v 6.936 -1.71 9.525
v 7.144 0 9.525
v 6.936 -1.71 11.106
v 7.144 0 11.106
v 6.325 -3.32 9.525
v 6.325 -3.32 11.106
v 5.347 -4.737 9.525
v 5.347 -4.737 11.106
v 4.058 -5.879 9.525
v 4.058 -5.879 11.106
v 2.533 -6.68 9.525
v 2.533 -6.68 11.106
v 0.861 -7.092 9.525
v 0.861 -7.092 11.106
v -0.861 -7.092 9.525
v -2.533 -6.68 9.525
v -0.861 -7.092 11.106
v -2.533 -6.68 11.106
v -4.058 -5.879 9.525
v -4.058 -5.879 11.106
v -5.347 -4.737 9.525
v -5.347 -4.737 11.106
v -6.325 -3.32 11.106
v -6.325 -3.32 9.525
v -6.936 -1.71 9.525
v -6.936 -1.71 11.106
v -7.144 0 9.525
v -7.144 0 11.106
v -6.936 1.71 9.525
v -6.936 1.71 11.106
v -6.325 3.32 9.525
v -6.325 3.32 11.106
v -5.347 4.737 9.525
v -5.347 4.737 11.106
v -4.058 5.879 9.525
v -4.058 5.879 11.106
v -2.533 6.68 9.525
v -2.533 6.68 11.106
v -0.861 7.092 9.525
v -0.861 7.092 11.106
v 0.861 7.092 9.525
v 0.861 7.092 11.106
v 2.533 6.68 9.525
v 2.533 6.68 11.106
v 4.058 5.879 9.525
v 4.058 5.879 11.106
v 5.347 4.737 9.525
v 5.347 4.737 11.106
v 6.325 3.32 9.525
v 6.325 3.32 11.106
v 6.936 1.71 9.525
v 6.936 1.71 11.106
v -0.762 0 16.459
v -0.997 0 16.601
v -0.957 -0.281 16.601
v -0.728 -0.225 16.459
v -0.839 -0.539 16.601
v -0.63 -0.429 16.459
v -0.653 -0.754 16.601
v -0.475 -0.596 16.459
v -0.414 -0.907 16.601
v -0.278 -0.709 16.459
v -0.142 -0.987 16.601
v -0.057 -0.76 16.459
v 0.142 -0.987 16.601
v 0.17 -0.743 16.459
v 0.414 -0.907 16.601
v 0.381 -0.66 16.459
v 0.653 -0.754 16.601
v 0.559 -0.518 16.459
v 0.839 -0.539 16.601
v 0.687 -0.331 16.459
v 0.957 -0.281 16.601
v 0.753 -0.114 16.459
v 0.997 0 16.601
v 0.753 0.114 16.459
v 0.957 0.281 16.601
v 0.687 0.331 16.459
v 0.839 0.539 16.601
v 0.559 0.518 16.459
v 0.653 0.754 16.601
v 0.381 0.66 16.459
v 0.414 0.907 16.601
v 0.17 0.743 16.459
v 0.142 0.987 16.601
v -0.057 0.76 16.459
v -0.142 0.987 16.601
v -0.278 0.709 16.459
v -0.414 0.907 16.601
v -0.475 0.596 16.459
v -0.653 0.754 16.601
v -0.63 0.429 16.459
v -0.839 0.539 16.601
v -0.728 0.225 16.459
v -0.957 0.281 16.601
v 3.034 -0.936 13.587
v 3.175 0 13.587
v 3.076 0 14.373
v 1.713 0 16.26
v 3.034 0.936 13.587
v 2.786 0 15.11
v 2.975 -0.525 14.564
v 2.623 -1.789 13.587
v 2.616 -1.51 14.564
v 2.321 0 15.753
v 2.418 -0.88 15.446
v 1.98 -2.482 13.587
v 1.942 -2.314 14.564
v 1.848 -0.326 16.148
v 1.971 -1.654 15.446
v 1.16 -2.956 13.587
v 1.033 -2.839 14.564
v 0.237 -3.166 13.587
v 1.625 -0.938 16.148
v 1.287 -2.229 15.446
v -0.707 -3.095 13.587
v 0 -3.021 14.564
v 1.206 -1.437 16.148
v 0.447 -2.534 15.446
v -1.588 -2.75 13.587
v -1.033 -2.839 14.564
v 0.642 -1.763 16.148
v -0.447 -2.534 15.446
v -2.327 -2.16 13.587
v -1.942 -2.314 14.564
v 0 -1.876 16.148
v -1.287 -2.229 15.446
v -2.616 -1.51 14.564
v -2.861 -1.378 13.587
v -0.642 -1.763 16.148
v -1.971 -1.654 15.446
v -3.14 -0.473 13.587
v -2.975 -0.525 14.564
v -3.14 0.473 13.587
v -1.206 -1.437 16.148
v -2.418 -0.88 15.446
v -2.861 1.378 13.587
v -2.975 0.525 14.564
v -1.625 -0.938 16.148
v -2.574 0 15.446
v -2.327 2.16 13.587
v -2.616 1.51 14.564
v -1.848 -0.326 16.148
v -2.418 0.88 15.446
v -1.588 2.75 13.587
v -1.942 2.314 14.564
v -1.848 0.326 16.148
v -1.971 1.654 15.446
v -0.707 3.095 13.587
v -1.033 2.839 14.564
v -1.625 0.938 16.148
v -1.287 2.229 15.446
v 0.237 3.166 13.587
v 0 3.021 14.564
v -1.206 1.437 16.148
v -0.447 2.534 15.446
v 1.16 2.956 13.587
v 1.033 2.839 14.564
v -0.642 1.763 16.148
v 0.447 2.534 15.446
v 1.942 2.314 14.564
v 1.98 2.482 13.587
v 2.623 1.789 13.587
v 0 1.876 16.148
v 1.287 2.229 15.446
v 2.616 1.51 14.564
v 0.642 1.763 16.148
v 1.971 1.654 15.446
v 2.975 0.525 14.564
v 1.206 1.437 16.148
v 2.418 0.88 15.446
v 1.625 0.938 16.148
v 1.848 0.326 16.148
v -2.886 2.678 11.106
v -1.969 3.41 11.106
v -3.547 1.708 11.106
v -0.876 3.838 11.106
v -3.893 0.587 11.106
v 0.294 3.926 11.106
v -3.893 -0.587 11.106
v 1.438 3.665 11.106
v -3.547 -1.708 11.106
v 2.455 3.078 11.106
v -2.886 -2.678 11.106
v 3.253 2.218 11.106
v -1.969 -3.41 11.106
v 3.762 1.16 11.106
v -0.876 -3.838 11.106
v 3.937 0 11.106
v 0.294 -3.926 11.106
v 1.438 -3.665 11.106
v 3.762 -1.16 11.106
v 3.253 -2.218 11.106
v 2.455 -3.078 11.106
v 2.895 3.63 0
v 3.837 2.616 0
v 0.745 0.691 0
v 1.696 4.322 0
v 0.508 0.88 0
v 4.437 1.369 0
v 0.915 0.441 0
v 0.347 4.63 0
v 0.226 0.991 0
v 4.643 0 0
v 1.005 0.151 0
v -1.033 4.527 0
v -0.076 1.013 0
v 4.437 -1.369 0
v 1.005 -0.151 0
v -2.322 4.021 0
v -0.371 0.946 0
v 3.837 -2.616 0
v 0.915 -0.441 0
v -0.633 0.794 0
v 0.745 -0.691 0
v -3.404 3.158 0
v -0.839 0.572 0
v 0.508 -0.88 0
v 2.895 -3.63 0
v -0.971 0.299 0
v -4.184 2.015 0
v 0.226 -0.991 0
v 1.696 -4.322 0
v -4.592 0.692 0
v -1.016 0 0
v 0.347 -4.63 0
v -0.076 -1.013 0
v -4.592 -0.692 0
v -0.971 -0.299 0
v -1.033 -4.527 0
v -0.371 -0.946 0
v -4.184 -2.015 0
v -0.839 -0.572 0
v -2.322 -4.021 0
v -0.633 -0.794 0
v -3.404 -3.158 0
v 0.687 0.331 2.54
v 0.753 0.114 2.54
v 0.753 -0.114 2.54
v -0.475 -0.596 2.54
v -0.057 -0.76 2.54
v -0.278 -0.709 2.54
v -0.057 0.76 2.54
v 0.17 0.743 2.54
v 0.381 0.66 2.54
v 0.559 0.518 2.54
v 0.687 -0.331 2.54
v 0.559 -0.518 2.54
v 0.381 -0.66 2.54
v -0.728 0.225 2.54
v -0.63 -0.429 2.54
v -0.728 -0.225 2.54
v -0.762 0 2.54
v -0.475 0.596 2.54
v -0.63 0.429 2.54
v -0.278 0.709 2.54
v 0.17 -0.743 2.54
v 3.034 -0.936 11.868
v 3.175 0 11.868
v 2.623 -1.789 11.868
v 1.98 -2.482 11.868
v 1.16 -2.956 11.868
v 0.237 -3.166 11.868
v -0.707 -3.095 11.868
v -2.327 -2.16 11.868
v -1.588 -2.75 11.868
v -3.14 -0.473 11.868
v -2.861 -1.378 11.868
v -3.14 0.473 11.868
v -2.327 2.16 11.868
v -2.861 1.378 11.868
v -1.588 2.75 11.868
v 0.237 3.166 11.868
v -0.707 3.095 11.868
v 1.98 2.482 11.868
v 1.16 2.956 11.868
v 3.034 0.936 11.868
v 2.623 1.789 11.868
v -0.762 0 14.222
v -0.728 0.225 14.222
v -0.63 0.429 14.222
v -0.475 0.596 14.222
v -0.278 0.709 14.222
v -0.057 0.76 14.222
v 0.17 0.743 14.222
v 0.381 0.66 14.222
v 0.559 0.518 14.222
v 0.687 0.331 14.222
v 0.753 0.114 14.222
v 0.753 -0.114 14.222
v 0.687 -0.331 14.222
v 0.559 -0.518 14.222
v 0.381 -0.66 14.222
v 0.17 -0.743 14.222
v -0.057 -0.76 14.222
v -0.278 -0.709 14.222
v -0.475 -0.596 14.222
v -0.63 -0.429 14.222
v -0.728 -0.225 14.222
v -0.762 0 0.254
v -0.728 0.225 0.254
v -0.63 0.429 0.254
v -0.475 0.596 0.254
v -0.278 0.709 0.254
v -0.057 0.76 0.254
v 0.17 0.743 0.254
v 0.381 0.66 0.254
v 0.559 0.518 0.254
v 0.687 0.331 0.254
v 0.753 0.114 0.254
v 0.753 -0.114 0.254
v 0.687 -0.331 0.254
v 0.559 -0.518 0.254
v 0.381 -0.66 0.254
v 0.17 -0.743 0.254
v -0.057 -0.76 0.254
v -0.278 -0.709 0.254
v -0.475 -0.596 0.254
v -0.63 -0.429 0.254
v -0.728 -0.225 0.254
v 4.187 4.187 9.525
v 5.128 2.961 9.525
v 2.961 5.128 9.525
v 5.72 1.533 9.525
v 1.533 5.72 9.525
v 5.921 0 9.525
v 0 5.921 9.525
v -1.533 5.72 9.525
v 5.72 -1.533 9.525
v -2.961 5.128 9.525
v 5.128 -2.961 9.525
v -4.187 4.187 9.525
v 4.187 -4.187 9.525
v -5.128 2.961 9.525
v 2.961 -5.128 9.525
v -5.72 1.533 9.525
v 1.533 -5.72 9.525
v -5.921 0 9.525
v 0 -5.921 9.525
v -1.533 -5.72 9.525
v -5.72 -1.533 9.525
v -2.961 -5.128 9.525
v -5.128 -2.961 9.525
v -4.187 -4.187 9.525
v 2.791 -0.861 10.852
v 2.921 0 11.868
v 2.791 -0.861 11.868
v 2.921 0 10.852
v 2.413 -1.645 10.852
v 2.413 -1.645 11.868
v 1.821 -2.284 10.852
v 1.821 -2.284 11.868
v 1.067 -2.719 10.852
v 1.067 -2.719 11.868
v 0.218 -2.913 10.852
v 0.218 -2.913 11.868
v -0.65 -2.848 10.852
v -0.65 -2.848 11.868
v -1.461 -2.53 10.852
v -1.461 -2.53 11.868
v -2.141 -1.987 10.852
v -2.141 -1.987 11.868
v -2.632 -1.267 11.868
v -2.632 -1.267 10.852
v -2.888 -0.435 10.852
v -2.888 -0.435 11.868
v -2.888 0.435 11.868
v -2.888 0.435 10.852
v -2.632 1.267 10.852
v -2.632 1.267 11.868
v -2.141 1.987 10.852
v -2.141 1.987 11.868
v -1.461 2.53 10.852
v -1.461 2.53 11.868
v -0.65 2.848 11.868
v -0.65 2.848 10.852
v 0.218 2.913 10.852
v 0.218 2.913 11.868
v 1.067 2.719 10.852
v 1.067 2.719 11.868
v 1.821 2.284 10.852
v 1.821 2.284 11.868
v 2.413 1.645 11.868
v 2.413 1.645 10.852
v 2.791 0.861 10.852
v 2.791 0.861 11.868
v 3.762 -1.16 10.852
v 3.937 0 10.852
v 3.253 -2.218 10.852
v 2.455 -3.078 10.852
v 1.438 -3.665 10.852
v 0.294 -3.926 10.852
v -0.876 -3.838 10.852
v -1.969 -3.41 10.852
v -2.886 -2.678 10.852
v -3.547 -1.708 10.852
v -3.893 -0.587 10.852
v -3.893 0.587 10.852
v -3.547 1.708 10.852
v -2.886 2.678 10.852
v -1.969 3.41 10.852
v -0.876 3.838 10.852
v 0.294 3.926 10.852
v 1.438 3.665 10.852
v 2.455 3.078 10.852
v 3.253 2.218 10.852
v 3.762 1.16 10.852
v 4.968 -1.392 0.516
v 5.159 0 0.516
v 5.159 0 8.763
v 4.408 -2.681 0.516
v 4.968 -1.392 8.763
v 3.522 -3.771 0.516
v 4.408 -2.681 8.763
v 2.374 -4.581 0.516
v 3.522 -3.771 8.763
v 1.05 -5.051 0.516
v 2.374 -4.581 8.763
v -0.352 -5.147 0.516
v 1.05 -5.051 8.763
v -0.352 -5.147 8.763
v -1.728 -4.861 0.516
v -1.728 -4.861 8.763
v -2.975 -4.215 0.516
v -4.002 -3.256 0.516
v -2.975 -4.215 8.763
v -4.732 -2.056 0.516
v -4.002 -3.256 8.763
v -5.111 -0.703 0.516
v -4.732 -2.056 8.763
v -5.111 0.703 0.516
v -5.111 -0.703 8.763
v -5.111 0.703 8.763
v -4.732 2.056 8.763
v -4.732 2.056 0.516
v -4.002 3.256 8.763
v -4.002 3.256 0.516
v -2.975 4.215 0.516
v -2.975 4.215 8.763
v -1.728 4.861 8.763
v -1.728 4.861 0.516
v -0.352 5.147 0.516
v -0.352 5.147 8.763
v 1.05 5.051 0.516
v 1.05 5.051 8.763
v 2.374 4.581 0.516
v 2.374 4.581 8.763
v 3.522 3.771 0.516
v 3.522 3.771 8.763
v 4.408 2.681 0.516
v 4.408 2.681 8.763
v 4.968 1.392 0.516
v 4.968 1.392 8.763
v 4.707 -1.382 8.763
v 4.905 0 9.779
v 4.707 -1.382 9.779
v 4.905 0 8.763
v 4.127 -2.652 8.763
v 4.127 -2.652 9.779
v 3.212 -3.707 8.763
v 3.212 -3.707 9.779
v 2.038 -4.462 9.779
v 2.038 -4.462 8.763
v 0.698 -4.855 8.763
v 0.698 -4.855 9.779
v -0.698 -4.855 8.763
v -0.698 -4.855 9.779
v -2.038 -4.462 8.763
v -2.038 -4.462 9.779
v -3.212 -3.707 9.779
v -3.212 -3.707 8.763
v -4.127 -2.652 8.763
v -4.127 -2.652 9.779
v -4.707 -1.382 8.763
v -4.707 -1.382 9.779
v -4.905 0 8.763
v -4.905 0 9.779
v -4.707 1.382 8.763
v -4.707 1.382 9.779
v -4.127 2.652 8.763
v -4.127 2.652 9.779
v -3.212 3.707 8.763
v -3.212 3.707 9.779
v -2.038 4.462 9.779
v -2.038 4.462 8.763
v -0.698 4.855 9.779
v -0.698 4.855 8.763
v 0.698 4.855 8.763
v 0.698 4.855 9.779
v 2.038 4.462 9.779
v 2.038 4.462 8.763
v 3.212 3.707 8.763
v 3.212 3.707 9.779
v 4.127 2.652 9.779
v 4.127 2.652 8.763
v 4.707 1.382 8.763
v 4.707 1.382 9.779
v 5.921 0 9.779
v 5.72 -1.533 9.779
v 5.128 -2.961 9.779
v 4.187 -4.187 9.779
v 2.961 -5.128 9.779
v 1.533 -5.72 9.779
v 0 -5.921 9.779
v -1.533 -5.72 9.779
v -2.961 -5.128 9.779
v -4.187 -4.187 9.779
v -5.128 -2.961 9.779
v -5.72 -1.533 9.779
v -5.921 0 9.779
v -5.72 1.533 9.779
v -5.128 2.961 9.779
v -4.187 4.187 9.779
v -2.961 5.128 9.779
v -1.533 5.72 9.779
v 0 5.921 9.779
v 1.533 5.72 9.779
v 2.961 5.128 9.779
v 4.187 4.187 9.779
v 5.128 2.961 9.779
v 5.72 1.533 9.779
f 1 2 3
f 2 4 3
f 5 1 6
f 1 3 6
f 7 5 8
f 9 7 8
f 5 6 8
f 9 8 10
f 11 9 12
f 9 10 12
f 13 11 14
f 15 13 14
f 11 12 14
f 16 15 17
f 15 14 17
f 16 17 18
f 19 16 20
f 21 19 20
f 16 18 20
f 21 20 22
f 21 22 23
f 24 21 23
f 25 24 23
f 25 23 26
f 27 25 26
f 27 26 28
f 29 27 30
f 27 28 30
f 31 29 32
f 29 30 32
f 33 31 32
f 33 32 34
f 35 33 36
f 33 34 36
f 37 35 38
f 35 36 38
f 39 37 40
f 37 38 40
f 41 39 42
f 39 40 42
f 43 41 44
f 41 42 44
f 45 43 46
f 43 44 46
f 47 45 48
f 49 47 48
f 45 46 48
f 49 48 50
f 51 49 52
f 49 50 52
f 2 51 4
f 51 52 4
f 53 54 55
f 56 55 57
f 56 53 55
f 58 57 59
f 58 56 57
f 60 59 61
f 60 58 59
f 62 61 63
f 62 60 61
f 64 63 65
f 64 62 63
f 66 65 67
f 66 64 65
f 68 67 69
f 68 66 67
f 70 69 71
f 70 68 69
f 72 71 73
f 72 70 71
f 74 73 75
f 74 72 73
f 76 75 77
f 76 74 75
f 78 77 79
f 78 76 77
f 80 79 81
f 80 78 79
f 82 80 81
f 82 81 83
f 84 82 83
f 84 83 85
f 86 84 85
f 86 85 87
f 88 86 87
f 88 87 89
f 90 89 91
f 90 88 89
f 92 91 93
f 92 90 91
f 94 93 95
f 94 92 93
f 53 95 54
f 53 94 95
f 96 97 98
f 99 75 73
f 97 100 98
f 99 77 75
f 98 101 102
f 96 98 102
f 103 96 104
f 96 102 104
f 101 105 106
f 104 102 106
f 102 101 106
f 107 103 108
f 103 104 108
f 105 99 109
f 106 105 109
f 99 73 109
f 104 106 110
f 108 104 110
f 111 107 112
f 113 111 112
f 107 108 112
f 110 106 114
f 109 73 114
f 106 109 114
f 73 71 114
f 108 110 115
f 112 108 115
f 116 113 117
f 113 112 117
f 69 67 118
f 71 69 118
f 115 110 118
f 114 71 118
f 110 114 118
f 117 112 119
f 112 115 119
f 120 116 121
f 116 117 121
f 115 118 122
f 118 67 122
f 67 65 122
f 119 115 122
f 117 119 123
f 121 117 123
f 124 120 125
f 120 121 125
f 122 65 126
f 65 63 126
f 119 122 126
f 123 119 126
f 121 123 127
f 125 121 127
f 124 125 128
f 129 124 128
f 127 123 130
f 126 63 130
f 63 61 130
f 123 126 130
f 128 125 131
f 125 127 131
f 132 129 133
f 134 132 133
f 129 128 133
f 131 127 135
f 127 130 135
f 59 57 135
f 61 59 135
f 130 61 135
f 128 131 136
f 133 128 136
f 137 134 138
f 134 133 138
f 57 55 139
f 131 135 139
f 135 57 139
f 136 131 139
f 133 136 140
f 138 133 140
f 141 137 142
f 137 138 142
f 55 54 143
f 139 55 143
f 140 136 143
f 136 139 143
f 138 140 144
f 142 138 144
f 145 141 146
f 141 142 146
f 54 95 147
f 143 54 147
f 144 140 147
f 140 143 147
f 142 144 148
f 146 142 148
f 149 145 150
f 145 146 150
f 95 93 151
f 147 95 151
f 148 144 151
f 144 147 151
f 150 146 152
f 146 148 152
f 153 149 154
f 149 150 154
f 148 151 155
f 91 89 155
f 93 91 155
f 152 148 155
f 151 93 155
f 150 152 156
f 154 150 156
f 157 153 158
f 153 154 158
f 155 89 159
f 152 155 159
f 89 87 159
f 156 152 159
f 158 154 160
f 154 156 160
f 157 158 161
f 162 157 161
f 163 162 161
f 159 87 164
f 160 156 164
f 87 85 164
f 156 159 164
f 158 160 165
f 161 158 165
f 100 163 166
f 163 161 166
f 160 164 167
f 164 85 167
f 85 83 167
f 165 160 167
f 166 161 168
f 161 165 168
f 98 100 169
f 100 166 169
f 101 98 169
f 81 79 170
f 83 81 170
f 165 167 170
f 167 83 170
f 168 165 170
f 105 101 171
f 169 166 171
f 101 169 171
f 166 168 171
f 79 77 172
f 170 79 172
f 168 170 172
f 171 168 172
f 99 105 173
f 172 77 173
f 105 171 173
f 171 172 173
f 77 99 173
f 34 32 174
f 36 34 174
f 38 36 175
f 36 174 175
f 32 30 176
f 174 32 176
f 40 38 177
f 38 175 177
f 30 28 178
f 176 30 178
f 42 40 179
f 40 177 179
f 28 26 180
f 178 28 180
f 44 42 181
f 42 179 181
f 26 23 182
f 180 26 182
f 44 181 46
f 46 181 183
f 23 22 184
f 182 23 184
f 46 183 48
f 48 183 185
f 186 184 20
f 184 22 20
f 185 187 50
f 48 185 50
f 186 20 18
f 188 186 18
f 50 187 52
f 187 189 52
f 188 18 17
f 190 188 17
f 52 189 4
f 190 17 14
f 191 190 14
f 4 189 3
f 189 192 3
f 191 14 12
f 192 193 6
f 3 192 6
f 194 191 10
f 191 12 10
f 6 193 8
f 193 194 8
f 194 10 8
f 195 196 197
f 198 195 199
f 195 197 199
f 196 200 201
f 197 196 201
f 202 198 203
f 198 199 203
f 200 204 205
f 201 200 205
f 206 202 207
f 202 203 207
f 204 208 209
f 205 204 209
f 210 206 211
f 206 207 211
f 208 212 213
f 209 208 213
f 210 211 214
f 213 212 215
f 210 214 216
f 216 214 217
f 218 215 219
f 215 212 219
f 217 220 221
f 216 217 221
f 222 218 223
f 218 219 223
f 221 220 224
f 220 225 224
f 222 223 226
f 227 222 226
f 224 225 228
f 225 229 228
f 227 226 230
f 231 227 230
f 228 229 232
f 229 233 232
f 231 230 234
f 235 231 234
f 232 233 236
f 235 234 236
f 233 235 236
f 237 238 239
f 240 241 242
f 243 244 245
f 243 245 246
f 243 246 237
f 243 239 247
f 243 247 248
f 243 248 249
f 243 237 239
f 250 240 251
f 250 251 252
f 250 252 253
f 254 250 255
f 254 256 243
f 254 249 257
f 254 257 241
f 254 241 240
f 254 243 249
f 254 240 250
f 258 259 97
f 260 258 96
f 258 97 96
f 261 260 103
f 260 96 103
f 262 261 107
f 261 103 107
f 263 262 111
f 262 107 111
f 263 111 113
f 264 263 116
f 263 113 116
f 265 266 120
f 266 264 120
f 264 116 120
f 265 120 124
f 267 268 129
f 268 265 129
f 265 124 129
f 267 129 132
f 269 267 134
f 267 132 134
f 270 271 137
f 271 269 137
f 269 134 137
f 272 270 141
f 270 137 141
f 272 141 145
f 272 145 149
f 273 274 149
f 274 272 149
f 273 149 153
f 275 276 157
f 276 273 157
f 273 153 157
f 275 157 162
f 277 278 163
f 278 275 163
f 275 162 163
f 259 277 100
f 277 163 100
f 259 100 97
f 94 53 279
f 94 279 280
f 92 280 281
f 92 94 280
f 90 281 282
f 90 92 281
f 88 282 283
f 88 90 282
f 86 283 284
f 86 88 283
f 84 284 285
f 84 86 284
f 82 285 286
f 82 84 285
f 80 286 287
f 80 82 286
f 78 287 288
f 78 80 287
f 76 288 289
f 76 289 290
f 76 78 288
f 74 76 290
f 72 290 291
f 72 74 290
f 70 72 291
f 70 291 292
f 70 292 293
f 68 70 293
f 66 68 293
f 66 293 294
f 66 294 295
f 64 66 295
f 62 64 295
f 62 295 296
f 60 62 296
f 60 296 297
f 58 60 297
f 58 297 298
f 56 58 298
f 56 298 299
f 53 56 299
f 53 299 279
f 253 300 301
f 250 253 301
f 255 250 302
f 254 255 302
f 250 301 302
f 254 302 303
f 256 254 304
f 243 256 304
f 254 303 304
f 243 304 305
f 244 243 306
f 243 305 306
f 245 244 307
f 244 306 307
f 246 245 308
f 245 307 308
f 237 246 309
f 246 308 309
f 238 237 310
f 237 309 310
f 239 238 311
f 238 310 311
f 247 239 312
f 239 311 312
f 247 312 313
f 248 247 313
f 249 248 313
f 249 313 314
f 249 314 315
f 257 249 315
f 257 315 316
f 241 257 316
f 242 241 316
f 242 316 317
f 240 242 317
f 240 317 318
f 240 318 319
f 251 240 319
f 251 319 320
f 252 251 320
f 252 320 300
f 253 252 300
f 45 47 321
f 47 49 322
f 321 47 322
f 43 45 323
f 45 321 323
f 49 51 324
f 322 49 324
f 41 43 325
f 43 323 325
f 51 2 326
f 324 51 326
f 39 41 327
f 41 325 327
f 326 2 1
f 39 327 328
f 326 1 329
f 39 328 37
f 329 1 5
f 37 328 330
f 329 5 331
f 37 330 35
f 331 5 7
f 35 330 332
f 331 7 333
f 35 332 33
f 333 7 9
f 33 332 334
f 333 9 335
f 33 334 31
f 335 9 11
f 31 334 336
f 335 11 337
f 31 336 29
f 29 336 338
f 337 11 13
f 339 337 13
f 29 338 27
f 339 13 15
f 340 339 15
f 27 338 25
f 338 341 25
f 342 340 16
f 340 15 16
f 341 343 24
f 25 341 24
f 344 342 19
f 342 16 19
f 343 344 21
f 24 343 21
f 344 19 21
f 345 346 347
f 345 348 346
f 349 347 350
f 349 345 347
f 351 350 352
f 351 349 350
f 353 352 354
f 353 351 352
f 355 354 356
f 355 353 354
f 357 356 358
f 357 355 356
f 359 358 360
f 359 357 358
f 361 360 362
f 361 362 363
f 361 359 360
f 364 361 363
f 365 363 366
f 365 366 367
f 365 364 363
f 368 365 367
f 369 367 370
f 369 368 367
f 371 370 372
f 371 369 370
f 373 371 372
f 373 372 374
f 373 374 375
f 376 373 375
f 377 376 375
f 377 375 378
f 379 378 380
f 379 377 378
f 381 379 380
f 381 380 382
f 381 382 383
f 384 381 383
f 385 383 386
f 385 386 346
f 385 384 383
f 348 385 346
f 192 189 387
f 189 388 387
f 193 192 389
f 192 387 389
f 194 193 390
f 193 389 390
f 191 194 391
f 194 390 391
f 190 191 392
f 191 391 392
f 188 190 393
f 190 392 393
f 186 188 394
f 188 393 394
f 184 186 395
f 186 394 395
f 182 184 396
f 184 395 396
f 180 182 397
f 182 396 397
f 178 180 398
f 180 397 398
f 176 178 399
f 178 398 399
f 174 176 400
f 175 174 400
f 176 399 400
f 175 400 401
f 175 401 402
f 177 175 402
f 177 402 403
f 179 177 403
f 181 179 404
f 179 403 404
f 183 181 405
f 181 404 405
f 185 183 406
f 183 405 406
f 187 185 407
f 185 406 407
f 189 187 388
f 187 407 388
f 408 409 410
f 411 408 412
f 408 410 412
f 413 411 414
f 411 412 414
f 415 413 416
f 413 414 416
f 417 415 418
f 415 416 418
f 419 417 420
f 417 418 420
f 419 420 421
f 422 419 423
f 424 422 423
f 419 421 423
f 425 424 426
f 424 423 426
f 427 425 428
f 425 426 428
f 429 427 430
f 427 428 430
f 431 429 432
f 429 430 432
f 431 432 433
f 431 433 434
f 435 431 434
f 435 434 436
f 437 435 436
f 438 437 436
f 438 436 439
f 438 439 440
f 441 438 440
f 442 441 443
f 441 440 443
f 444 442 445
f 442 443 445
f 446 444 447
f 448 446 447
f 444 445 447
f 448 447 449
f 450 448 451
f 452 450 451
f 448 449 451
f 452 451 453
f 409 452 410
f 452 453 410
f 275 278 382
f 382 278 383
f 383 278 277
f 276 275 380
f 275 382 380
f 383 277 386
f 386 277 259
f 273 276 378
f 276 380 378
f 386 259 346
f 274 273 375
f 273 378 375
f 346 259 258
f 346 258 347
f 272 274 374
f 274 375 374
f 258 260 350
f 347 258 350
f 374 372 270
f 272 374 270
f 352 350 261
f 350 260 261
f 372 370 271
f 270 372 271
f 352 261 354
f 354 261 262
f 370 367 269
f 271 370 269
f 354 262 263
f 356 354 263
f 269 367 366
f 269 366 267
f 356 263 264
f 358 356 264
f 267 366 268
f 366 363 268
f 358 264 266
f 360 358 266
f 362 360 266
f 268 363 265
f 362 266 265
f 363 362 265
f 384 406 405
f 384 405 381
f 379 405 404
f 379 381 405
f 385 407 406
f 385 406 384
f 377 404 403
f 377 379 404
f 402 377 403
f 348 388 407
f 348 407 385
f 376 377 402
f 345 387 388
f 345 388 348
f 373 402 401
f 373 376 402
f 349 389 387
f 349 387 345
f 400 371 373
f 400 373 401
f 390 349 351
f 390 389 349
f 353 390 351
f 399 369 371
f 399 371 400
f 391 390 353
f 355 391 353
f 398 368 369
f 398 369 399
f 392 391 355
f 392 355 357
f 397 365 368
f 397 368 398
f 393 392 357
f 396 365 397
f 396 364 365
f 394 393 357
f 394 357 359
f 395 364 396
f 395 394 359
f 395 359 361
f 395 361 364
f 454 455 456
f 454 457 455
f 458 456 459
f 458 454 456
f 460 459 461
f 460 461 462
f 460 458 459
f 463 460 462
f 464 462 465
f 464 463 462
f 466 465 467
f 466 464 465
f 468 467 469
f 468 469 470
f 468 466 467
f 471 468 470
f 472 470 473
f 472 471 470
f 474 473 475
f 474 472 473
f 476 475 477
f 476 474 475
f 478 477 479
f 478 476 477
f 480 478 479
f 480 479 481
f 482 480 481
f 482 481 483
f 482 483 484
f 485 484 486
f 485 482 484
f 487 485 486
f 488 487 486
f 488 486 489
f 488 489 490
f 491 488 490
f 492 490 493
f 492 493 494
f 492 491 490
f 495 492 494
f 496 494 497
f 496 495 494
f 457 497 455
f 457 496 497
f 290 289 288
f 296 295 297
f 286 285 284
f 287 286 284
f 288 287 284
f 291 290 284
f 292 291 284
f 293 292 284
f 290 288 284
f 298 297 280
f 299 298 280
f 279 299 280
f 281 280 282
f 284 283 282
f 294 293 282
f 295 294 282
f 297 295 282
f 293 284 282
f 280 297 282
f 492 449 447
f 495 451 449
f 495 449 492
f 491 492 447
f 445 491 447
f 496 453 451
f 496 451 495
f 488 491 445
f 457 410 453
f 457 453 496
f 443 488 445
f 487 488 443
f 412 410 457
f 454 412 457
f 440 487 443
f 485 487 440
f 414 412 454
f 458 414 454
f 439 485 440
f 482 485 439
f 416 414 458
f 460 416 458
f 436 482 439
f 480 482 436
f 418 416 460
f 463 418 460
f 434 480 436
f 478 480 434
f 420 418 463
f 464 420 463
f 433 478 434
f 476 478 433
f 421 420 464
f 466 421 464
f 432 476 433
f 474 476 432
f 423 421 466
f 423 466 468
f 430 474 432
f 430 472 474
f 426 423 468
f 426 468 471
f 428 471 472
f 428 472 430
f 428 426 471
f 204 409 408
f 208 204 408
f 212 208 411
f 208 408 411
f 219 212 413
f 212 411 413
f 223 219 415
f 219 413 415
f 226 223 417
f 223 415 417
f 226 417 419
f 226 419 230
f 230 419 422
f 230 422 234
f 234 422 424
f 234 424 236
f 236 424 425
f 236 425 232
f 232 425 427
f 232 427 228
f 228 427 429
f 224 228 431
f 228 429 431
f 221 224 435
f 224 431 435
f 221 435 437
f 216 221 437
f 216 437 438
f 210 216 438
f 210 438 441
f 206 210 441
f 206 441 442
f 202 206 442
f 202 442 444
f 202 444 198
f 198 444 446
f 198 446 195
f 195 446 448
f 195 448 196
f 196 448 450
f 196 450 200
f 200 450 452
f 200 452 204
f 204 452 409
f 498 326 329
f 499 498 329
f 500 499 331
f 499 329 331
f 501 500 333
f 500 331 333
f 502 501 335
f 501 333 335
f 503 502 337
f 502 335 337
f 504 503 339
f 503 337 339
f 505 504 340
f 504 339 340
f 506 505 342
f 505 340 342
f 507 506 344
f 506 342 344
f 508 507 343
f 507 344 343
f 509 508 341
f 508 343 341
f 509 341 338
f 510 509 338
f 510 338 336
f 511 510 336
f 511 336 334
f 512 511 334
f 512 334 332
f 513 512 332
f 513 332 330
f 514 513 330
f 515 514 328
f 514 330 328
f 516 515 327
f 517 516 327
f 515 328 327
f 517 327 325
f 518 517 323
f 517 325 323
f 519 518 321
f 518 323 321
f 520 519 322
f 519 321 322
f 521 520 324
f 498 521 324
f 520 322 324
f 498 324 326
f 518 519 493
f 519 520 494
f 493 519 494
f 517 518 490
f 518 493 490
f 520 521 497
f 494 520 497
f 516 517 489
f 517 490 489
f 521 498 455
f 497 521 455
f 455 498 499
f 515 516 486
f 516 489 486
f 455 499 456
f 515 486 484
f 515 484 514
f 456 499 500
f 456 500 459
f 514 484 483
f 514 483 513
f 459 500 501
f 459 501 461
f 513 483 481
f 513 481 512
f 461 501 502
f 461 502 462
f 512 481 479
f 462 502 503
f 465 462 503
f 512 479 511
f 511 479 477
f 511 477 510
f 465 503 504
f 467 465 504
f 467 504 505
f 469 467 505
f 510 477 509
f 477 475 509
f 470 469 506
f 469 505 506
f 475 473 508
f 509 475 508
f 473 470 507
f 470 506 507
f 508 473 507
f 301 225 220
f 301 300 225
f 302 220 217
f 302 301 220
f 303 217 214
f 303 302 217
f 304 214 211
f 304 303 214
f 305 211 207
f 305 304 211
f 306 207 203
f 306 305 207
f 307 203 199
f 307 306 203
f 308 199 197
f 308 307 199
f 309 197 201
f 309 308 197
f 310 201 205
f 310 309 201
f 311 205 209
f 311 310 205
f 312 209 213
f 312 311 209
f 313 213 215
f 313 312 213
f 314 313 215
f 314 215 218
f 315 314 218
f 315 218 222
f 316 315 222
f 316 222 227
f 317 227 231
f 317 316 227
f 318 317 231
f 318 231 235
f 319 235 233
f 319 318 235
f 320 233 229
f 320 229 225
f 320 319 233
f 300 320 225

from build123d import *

# Parameters (mm, degrees)
SKETCH3_W          = 1.016
SKETCH3_H          = 1.016
CHAMFER1_SIZE      = 0.5159375
SKETCH2_R          = 0.762
CUT_EXTRUDE1_DEPTH = 2.54
CHAMFER2_SIZE      = 0.254
CHAMFER2_SIZE_2    = 0.209783356


with BuildPart() as part:
    # Sketch1 → Revolve1 (revolve)
    with BuildSketch(Plane(origin=(0, 0, 0), x_dir=(0, 0, -1), z_dir=(1, 0, 0)), mode=Mode.PRIVATE) as revolve1_sk:
        with BuildLine():
            Line((0, 0), (0, 5.159375))
            Line((0, 5.159375), (-9.525, 5.159375))
            Line((-9.525, 5.159375), (-9.525, 7.14375))
            Line((-9.525, 7.14375), (-11.10615, 7.14375))
            Line((-11.10615, 7.14375), (-11.10615, 3.175))
            Line((-11.10615, 3.175), (-13.586546081, 3.175))
            ThreePointArc((-13.586546081, 3.175), (-15.831610111, 2.24506403), (-16.761546081, 0))
            Line((-16.761546081, 0), (0, 0))
        make_face()
    revolve(revolve1_sk.sketch.rotate(Axis((0, 0, 17.430941175), (0, 0, -1)), 90), axis=Axis((0, 0, 17.430941175), (0, 0, -1)))

    # Sketch3 → Cut-Revolve1 (revolve, cut)
    with BuildSketch(Plane(origin=(0, 0, 0), x_dir=(0, 0, -1), z_dir=(1, 0, 0)), mode=Mode.PRIVATE) as cut_revolve1_sk:
        with Locations((-11.36015, 3.429)):
            Rectangle(SKETCH3_W, SKETCH3_H)
        with Locations((-9.271, 5.413375)):
            Rectangle(SKETCH3_W, SKETCH3_H)
    revolve(cut_revolve1_sk.sketch.rotate(Axis((0, 0, 17.430941175), (0, 0, -1)), 90), axis=Axis((0, 0, 17.430941175), (0, 0, -1)), mode=Mode.SUBTRACT)

    # Chamfer1
    chamfer1_edges = [part.edges().sort_by_distance(p)[0] for p in [
        (-5.159375, 0, 0),
    ]]
    chamfer(chamfer1_edges, length=CHAMFER1_SIZE)

    # Sketch2 → Cut-Extrude1 (cut)
    with BuildSketch(Plane(origin=(0, 0, 0), x_dir=(-1, 0, 0), z_dir=(0, 0, -1))):
        Circle(SKETCH2_R)
    cut_extrude1 = extrude(amount=-CUT_EXTRUDE1_DEPTH, mode=Mode.SUBTRACT)

    # Mirror1: Cut-Extrude1 across plane
    add(cut_extrude1.mirror(Plane.XY.offset(8.38077304)), mode=Mode.SUBTRACT)

    # Chamfer2
    # the kernel refuses this chamfer: 0.254, 0.209783356 mm, written as the material it takes off along each edge
    with BuildSketch(Plane(origin=(0, 0, 0), x_dir=(-1, 0, 0), z_dir=(0, -1, 0))) as chamfer2_piece_1:
        Polygon((0.762 + CHAMFER2_SIZE, 0), (0.762, -CHAMFER2_SIZE), (0.762, 0), align=None)
    revolve(axis=Axis((0, 0, 0), (0, 0, -1)), mode=Mode.SUBTRACT)
    with BuildSketch(Plane(origin=(0, 0, 16.66875), x_dir=(-1, 0, 0), z_dir=(0, 1, 0))) as chamfer2_piece_2:
        with BuildLine():
            Line((0.997154658, -0.067853643), (0.762, -CHAMFER2_SIZE_2))
            Line((0.762, -CHAMFER2_SIZE_2), (0.762, 0))
            ThreePointArc((0.762, 0), (0.883545152, -0.032618216), (0.997154658, -0.067853643))
        make_face()
    revolve(axis=Axis((0, 0, 16.66875), (0, 0, 1)), revolution_arc=180, mode=Mode.SUBTRACT)
    with BuildSketch(Plane(origin=(0, 0, 16.66875), x_dir=(1, 0, 0), z_dir=(0, -1, 0))) as chamfer2_piece_3:
        with BuildLine():
            Line((0.997154658, -0.067853643), (0.762, -CHAMFER2_SIZE_2))
            Line((0.762, -CHAMFER2_SIZE_2), (0.762, 0))
            ThreePointArc((0.762, 0), (0.883545152, -0.032618216), (0.997154658, -0.067853643))
        make_face()
    revolve(axis=Axis((0, 0, 16.66875), (0, 0, 1)), revolution_arc=180, mode=Mode.SUBTRACT)


solid = part.part
